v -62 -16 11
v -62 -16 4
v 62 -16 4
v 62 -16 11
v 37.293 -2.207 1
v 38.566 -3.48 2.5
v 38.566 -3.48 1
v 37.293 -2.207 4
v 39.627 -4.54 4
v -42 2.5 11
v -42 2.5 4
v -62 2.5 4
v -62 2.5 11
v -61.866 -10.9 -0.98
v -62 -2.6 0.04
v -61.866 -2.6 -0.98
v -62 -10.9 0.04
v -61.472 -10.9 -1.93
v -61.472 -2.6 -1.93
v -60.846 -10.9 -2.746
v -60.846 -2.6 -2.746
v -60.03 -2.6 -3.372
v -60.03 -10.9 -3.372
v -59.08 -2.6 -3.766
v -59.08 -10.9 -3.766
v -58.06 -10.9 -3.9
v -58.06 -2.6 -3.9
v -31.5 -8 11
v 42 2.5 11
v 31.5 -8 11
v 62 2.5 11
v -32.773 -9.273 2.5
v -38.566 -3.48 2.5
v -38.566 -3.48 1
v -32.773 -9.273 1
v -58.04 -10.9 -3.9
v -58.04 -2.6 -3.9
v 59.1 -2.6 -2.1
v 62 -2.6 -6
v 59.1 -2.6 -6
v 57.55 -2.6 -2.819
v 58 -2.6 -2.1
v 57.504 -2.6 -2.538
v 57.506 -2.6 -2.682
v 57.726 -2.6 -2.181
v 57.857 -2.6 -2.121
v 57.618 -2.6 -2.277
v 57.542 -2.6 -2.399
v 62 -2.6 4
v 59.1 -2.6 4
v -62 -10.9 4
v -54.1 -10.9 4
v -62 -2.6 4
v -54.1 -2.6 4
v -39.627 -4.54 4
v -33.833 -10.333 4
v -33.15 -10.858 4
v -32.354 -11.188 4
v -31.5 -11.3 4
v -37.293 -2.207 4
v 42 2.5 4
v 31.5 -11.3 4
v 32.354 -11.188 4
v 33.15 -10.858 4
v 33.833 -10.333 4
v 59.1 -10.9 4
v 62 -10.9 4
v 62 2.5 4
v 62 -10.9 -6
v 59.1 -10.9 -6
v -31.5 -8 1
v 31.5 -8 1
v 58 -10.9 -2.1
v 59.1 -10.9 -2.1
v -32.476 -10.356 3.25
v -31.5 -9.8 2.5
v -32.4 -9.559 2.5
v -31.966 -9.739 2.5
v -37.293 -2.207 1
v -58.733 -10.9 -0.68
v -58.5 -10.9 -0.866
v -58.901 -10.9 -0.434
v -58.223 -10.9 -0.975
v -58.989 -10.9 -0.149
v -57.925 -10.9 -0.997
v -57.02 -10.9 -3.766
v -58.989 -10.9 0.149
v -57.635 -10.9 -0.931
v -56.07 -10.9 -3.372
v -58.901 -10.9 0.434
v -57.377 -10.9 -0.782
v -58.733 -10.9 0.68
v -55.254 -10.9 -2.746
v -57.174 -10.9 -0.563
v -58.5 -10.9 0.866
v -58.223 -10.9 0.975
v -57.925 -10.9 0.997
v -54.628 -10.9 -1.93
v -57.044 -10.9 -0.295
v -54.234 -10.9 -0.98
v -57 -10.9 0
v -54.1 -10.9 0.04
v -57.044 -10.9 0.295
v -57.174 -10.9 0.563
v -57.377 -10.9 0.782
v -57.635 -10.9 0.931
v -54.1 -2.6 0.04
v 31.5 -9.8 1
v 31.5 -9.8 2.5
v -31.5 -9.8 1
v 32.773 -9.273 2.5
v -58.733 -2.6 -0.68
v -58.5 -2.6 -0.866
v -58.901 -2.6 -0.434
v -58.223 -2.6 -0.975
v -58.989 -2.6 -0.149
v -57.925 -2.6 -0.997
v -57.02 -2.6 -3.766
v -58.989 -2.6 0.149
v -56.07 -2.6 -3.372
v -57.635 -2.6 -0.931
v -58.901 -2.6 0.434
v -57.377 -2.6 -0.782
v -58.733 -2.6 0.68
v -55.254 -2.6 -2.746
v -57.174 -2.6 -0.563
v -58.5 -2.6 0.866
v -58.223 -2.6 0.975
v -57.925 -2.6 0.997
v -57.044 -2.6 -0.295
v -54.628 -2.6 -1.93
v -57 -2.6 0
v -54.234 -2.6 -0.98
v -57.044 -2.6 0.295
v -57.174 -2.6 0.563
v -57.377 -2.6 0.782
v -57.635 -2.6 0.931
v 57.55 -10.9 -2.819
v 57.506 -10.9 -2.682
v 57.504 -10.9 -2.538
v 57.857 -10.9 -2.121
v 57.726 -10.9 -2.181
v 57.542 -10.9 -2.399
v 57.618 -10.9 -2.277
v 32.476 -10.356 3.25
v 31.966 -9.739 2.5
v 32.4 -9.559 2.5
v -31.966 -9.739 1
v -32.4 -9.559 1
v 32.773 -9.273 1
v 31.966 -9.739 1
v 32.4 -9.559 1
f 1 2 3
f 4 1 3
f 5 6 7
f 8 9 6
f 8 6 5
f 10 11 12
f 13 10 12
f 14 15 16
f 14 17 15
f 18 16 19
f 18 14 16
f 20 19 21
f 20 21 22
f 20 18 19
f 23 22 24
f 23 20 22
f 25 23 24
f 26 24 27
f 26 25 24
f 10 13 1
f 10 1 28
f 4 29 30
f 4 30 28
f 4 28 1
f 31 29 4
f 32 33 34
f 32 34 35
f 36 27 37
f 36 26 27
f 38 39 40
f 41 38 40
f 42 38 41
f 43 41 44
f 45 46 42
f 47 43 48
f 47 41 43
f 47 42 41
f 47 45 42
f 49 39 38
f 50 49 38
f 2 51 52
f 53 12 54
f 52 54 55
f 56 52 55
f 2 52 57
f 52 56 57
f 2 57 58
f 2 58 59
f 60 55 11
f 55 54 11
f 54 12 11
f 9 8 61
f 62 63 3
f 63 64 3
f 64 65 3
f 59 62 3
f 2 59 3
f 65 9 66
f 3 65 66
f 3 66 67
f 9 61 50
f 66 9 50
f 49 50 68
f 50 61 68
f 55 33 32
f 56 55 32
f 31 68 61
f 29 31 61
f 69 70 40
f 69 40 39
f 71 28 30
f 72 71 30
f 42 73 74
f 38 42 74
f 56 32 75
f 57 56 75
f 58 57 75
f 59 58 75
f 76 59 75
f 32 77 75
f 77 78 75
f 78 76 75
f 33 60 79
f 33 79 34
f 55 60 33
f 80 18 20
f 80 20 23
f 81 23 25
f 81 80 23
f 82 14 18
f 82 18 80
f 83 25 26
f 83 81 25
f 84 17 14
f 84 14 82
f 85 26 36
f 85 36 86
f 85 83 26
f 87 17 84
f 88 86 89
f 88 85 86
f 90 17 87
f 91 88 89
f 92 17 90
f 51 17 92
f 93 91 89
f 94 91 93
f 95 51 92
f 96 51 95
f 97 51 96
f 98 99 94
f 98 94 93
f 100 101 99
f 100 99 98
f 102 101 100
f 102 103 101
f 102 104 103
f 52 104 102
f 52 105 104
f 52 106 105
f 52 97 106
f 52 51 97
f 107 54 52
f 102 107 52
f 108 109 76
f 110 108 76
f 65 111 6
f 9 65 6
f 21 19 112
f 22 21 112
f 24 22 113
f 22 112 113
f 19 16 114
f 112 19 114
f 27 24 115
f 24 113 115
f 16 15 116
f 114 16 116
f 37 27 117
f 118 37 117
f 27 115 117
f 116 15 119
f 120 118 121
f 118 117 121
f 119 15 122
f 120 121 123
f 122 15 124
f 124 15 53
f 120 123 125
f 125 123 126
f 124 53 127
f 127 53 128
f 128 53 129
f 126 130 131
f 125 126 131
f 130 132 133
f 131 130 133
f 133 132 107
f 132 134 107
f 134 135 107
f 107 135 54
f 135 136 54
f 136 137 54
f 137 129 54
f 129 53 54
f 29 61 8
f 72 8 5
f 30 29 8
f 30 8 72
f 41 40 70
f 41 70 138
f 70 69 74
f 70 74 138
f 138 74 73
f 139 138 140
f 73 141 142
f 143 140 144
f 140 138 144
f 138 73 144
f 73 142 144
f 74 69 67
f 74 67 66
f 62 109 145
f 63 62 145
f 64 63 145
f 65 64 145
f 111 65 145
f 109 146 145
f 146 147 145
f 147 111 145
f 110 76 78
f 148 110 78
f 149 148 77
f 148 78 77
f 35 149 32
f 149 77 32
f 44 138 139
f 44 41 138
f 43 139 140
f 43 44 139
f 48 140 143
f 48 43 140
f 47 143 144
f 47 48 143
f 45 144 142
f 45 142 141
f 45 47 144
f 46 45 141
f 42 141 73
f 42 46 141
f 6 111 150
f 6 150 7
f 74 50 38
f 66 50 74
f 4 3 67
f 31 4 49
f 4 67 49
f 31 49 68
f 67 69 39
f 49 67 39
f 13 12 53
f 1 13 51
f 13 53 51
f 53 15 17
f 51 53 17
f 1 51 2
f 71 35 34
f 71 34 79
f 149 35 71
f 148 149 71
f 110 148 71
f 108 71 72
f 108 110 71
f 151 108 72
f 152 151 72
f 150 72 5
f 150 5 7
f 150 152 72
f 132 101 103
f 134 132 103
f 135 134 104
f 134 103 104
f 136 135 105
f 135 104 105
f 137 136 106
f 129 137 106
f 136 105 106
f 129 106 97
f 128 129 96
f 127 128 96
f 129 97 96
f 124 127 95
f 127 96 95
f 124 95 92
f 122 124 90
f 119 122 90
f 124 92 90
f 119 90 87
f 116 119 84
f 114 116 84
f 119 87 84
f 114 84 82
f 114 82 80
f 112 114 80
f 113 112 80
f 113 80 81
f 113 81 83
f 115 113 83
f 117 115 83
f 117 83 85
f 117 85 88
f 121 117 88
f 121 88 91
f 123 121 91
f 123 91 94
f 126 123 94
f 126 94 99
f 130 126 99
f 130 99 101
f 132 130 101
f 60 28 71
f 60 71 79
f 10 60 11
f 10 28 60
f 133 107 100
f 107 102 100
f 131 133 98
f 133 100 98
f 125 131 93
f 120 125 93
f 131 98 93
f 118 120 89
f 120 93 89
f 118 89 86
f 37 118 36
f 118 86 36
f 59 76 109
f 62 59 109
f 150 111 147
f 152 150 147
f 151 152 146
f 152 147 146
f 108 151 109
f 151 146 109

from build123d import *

# Parameters (mm, degrees)
PAD002_DEPTH    = 7
PAD003_DEPTH    = 3
CHAMFER003_SIZE = 1.5
SKETCH009_W     = 7.9
SKETCH009_H     = 8.3
PAD004_DEPTH    = 7.9
FILLET001_R     = 3.94
SKETCH010_R     = 1
HOLE002_DEPTH   = 25
SKETCH012_W     = 2.9
SKETCH012_H     = 8.3
PAD005_DEPTH    = 10
PAD006_DEPTH    = 8.3
FILLET002_R     = 0.5


with BuildPart() as part:
    # Sketch006 → Pad002 (new body)
    with BuildSketch(Plane.XY.offset(4)):
        Polygon((-62, 2.5), (-62, -16), (62, -16), (62, 2.5), (42, 2.5), (31.5, -8), (-31.5, -8), (-42, 2.5), align=None)
    extrude(amount=PAD002_DEPTH)

    # Sketch007 (on Face9 of Pad002) → Pad003 (join)
    with BuildSketch(Plane(origin=(0, 0, 4), x_dir=(1, 0, 0), z_dir=(0, 0, -1))):
        with BuildLine():
            Line((-31.5, 8), (31.5, 8))
            Line((37.293259, 2.206741), (31.5, 8))
            Line((38.566051, 3.479533), (37.293259, 2.206741))
            Line((32.772792, 9.272792), (38.566051, 3.479533))
            ThreePointArc((32.772792, 9.272792), (32.18883, 9.662983), (31.5, 9.8))
            Line((31.5, 9.8), (-31.5, 9.8))
            ThreePointArc((-31.5, 9.8), (-32.18883, 9.662983), (-32.772792, 9.272792))
            Line((-38.566051, 3.479533), (-32.772792, 9.272792))
            Line((-37.293259, 2.206741), (-38.566051, 3.479533))
            Line((-31.5, 8), (-37.293259, 2.206741))
        make_face()
    extrude(amount=PAD003_DEPTH)

    # Chamfer003
    chamfer003_edges = [part.edges().sort_by_distance(p)[0] for p in [
        (-35.669422, -6.376163, 4),
    ]]
    chamfer(chamfer003_edges, length=CHAMFER003_SIZE)

    # Sketch009 (on Face1 of Chamfer003) → Pad004 (join)
    with BuildSketch(Plane(origin=(0, 0, 4), x_dir=(1, 0, 0), z_dir=(0, 0, -1))):
        with Locations((-58.05, 6.75)):
            Rectangle(SKETCH009_W, SKETCH009_H)
    extrude(amount=PAD004_DEPTH)

    # Fillet001
    fillet001_edges = [part.edges().sort_by_distance(p)[0] for p in [
        (-54.1, -6.75, -3.9),
        (-62, -6.75, -3.9),
    ]]
    fillet(fillet001_edges, radius=FILLET001_R)

    # Sketch010 (on Face1 of Fillet001) → Hole002 (cut)
    with BuildSketch(Plane.XZ.offset(10.9)):
        with Locations((-58, 0)):
            Circle(SKETCH010_R)
    extrude(amount=-HOLE002_DEPTH, mode=Mode.SUBTRACT)

    # Sketch012 (on Face4 of Hole002) → Pad005 (join)
    with BuildSketch(Plane(origin=(0, 0, 4), x_dir=(1, 0, 0), z_dir=(0, 0, -1))):
        with Locations((60.55, 6.75)):
            Rectangle(SKETCH012_W, SKETCH012_H)
    extrude(amount=PAD005_DEPTH)

    # Sketch013 (on Face21 of Pad005) → Pad006 (join)
    with BuildSketch(Plane.XZ.offset(10.9)):
        Polygon((59.1, -6), (57.2, -2.1), (59.1, -2.1), align=None)
    extrude(amount=-PAD006_DEPTH)

    # Fillet002
    fillet002_edges = [part.edges().sort_by_distance(p)[0] for p in [
        (57.2, -6.75, -2.1),
    ]]
    fillet(fillet002_edges, radius=FILLET002_R)


solid = part.part
